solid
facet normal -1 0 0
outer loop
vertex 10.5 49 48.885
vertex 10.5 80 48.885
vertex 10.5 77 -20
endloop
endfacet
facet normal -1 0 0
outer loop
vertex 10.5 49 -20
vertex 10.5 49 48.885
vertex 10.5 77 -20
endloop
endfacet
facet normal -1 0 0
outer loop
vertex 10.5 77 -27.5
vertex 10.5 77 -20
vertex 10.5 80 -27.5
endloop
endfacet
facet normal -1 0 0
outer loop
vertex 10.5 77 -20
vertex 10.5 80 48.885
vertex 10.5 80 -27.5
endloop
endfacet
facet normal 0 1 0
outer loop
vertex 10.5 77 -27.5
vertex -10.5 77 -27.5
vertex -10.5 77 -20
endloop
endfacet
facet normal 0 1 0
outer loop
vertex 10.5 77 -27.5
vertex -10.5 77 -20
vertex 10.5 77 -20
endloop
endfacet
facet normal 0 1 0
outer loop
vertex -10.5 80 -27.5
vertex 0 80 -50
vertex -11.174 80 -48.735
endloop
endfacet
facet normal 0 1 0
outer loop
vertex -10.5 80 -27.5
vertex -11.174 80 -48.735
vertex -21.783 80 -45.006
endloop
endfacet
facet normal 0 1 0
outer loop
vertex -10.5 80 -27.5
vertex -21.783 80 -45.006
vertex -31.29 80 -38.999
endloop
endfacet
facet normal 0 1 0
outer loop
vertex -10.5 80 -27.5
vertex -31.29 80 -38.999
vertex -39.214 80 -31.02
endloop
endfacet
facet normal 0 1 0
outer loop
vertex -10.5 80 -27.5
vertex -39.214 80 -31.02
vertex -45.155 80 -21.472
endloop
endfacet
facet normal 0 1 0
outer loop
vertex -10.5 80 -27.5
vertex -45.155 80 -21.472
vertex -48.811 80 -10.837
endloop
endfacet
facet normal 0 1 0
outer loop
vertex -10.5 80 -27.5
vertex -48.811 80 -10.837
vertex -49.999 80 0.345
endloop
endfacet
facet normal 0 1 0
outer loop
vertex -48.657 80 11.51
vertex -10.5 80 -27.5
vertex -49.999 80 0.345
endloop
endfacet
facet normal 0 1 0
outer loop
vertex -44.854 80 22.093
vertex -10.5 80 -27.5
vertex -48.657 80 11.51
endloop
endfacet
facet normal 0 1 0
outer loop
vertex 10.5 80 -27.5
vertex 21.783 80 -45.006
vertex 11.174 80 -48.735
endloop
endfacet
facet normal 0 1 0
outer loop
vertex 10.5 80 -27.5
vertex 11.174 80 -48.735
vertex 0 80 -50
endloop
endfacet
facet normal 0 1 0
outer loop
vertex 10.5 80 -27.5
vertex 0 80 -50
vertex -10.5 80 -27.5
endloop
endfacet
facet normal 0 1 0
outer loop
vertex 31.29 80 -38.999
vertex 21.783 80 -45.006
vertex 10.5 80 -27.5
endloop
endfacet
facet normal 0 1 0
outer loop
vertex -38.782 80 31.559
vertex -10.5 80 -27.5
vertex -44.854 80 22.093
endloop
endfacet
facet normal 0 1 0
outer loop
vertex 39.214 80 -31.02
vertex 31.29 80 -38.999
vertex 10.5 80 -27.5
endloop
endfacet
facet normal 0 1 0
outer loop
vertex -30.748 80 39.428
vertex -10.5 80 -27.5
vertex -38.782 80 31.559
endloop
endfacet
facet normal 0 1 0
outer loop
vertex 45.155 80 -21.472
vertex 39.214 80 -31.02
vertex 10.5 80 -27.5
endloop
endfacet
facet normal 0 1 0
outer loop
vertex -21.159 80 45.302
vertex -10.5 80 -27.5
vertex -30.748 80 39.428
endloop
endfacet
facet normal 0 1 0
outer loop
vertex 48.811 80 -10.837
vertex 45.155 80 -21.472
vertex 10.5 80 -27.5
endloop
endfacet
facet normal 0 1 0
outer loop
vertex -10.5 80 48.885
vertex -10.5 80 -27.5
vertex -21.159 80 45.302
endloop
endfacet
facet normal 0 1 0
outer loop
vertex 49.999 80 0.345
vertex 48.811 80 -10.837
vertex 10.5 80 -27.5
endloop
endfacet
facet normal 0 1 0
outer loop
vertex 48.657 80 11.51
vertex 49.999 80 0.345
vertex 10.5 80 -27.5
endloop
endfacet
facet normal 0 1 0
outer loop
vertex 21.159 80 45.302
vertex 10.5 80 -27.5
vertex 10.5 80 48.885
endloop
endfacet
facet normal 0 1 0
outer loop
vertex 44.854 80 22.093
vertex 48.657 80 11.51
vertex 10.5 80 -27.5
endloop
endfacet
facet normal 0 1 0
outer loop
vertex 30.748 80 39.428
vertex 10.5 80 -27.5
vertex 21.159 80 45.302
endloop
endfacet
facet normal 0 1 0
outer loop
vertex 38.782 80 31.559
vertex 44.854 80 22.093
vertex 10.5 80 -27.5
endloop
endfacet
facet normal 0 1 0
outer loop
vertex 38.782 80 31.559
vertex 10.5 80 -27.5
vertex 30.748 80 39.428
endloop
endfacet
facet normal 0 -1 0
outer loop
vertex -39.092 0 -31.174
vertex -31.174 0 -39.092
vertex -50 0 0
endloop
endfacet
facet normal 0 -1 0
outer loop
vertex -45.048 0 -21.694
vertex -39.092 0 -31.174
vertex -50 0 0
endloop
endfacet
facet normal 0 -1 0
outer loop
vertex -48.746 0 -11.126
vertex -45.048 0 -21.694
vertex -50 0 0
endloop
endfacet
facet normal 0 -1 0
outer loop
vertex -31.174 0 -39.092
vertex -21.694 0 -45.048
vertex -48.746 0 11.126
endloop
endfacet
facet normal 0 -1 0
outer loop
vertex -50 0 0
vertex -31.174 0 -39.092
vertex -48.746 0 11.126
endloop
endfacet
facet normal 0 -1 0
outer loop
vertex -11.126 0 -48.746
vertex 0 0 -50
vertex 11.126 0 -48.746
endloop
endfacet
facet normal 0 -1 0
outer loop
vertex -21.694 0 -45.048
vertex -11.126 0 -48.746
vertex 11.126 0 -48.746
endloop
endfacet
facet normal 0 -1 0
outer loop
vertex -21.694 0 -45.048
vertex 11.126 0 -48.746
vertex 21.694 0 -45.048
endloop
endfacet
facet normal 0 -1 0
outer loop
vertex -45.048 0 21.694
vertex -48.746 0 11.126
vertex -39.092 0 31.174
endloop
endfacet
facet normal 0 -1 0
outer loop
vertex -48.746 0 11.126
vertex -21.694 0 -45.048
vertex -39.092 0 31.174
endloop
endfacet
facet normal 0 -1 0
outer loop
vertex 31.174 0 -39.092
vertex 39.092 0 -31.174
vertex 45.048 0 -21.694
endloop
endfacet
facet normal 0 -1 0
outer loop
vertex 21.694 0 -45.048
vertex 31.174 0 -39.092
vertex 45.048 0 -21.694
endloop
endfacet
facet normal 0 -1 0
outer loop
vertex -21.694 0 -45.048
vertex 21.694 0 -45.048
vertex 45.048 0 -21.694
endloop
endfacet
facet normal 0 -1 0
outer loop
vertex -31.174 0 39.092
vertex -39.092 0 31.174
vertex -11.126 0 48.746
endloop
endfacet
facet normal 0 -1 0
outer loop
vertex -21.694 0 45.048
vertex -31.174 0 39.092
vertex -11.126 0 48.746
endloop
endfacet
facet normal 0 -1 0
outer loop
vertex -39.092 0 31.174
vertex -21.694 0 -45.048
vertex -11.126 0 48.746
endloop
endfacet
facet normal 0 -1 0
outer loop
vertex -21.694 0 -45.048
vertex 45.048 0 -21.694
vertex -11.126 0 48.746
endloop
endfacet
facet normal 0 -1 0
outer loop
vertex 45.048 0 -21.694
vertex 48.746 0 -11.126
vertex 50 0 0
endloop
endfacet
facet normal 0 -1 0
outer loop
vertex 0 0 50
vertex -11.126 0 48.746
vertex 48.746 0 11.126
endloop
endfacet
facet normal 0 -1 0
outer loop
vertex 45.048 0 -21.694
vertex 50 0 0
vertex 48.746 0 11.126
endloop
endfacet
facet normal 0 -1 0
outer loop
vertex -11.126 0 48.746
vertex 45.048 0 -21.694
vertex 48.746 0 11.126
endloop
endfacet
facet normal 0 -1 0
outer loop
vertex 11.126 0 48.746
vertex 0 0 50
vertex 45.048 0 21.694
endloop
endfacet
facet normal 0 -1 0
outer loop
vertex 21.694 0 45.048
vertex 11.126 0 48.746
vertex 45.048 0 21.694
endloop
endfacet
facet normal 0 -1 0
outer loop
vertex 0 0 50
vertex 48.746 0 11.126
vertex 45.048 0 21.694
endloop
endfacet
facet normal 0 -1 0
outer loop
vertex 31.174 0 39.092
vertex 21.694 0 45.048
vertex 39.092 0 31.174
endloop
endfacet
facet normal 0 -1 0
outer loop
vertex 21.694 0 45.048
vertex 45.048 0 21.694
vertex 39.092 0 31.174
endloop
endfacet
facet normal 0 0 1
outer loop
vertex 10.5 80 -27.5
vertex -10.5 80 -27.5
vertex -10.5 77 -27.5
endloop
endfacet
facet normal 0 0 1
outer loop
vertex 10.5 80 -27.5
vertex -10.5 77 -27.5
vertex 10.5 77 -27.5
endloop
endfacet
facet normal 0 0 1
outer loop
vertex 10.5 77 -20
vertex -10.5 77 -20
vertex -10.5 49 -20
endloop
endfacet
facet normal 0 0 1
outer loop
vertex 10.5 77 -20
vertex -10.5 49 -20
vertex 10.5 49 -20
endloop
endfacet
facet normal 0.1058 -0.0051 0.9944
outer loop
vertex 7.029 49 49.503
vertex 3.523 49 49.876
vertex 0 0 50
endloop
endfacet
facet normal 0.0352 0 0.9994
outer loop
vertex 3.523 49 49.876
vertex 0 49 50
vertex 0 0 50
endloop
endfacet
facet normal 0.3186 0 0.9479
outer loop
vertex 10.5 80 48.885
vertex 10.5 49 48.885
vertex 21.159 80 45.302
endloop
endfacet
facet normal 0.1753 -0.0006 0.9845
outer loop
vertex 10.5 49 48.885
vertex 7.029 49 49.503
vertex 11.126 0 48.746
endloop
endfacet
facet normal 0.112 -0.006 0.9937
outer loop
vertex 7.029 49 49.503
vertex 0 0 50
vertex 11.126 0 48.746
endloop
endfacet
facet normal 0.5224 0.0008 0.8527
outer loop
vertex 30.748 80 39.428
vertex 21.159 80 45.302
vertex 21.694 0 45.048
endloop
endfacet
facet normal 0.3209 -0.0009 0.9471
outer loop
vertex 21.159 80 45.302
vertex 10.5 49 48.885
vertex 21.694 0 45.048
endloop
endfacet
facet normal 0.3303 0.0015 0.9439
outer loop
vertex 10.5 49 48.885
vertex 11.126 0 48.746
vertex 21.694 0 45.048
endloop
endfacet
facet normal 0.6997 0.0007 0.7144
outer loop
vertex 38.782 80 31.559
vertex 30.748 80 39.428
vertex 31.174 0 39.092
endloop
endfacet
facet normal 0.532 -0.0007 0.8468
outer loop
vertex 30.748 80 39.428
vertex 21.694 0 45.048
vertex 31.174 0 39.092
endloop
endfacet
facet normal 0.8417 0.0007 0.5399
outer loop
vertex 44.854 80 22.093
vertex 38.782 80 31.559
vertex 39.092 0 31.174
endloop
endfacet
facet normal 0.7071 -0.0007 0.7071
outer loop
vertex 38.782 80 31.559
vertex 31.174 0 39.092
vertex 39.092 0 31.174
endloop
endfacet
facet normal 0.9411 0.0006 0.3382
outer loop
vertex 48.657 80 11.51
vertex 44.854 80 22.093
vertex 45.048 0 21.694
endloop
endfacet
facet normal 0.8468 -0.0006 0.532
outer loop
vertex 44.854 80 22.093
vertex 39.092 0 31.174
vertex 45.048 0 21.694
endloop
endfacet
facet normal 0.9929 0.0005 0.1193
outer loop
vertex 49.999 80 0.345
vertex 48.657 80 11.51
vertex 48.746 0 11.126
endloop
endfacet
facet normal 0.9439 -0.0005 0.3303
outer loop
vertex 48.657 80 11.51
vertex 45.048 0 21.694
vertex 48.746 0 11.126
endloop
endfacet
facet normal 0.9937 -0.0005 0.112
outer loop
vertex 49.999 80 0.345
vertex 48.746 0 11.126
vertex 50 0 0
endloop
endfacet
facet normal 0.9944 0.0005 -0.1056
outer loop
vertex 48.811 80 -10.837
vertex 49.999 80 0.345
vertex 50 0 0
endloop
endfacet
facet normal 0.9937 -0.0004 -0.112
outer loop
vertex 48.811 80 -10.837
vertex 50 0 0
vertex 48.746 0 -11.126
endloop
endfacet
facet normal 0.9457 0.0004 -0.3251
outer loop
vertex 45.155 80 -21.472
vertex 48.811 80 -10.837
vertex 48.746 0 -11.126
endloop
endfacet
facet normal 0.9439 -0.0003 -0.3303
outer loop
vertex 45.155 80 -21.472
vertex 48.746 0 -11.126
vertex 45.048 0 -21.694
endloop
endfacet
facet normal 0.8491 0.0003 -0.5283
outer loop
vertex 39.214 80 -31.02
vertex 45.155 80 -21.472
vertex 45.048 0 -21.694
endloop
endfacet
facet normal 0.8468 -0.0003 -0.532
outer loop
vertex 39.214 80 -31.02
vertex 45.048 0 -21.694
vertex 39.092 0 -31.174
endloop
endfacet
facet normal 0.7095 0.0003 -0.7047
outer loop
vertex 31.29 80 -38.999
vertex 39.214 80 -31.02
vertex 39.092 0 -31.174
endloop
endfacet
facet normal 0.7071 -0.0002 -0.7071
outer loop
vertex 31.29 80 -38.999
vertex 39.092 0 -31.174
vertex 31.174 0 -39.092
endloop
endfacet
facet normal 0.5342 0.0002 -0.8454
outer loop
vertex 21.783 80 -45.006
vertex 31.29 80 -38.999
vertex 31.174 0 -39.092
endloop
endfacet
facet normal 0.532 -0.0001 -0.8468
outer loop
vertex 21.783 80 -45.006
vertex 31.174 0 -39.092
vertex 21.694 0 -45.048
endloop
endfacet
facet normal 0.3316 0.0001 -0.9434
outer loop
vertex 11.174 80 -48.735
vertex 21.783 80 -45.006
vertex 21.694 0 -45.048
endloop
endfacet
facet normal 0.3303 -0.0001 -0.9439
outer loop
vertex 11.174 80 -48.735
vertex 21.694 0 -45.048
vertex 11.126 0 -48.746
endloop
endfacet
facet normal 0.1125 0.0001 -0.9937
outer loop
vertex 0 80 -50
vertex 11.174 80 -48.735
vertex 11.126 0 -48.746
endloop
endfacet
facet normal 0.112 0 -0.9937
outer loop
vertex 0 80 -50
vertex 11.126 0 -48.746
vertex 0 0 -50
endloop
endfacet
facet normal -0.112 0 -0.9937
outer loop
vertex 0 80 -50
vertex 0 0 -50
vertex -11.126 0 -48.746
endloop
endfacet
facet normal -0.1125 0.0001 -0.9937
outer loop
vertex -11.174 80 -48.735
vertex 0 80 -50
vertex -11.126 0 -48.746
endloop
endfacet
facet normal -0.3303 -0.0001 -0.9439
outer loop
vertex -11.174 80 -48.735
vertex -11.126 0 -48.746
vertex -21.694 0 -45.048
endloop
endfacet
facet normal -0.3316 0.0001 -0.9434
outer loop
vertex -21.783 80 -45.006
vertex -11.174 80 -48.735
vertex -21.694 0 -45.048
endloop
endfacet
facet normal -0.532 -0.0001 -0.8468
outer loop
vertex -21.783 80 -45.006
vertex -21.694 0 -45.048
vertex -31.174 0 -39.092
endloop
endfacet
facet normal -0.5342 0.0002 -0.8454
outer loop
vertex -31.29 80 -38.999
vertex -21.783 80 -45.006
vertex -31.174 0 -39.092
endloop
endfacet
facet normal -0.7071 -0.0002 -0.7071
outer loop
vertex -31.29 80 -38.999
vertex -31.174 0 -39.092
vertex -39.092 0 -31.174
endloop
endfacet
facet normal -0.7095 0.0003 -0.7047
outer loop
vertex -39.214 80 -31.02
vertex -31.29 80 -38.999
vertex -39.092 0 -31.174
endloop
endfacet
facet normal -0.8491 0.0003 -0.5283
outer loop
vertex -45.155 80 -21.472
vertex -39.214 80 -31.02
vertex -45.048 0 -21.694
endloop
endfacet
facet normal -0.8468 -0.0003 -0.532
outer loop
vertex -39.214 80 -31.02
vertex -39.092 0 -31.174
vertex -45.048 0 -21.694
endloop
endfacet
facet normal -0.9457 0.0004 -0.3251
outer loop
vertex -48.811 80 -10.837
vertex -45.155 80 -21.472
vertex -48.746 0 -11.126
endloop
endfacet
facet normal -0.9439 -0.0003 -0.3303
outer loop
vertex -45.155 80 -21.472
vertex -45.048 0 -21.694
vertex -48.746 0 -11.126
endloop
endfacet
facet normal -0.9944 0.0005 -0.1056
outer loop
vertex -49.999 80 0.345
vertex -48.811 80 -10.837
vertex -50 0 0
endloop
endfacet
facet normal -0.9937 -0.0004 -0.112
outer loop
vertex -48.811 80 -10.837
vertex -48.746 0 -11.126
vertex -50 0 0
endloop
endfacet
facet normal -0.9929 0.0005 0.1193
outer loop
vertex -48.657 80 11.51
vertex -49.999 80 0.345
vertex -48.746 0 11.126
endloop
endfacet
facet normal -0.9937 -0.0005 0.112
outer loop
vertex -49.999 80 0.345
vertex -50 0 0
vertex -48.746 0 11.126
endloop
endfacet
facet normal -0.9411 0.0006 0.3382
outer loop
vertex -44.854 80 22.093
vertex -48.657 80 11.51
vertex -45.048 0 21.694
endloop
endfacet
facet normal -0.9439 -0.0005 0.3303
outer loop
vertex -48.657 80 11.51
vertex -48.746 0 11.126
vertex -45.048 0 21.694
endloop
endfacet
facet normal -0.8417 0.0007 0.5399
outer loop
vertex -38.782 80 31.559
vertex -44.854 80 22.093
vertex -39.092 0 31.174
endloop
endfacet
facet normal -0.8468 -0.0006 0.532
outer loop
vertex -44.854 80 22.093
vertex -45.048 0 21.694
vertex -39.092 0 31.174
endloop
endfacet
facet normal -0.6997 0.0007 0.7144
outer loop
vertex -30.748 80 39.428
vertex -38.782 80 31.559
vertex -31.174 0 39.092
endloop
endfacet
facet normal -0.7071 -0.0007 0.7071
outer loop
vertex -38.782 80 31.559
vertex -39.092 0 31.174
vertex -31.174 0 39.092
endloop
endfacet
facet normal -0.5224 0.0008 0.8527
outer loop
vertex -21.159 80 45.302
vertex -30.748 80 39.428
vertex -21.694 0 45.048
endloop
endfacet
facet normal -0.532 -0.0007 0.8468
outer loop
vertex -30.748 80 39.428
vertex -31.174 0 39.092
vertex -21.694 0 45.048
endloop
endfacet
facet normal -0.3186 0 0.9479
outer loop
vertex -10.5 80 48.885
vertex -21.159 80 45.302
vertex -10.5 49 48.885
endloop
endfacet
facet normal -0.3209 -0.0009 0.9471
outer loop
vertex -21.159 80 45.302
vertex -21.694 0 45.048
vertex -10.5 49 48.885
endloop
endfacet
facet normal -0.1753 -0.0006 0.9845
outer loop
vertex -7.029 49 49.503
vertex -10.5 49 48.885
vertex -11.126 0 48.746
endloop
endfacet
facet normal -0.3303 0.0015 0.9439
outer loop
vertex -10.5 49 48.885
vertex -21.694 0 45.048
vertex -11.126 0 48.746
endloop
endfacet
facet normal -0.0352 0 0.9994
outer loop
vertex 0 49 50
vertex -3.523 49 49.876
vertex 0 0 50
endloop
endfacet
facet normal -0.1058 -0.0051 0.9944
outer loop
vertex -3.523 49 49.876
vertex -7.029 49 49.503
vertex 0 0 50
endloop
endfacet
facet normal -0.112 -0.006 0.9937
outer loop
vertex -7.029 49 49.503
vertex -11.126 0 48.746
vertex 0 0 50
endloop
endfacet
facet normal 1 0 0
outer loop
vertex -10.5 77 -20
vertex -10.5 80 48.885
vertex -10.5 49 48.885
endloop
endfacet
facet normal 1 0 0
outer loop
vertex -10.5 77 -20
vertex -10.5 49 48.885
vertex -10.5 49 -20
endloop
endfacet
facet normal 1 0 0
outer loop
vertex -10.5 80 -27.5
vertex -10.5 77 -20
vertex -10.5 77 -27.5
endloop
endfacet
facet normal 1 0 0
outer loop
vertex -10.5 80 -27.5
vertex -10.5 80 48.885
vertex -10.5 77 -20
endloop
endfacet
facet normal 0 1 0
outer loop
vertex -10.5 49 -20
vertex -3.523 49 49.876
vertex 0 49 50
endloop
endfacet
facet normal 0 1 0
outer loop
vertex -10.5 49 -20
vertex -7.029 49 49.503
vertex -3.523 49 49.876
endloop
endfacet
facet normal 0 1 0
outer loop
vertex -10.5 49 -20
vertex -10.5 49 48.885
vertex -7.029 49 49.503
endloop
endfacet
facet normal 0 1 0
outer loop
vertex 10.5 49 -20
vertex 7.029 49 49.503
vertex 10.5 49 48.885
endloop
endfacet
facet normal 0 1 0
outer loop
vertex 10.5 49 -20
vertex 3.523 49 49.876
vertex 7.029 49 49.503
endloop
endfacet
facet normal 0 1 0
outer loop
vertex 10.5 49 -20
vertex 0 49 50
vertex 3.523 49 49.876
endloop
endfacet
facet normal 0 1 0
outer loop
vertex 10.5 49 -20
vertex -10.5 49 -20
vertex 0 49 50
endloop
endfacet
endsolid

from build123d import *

# Parameters (mm, degrees)
SKETCH2_R           = 50
BOSS_EXTRUDE1_DEPTH = 80
SKETCH3_W           = 21
SKETCH3_H           = 55
CUT_EXTRUDE2_DEPTH  = 3
SKETCH4_W           = 21
SKETCH4_H           = 40
CUT_EXTRUDE3_DEPTH  = 28
SKETCH5_W           = 21
SKETCH5_H           = 56.862422016
CUT_EXTRUDE4_DEPTH  = 31


with BuildPart() as part:
    # Sketch2 → Boss-Extrude1 (new body)
    with BuildSketch(Plane(origin=(0, 0, 0), x_dir=(1, 0, 0), z_dir=(0, 1, 0))):
        with Locations(Location((0, 0, 0), (0, 0, 270))):
            Circle(SKETCH2_R)
    extrude(amount=BOSS_EXTRUDE1_DEPTH)

    # Sketch3 → Cut-Extrude2 (cut)
    with BuildSketch(Plane(origin=(0, 80, 0), x_dir=(1, 0, 0), z_dir=(0, 1, 0))):
        Rectangle(SKETCH3_W, SKETCH3_H)
    extrude(amount=-CUT_EXTRUDE2_DEPTH, mode=Mode.SUBTRACT)

    # Sketch4 → Cut-Extrude3 (cut)
    with BuildSketch(Plane(origin=(0, 77, 0), x_dir=(1, 0, 0), z_dir=(0, 1, 0))):
        Rectangle(SKETCH4_W, SKETCH4_H)
    extrude(amount=-CUT_EXTRUDE3_DEPTH, mode=Mode.SUBTRACT)

    # Sketch5 → Cut-Extrude4 (cut)
    with BuildSketch(Plane(origin=(0, 80, 0), x_dir=(1, 0, 0), z_dir=(0, 1, 0))):
        with Locations((0, -28.431211008)):
            Rectangle(SKETCH5_W, SKETCH5_H)
    extrude(amount=-CUT_EXTRUDE4_DEPTH, mode=Mode.SUBTRACT)


solid = part.part
